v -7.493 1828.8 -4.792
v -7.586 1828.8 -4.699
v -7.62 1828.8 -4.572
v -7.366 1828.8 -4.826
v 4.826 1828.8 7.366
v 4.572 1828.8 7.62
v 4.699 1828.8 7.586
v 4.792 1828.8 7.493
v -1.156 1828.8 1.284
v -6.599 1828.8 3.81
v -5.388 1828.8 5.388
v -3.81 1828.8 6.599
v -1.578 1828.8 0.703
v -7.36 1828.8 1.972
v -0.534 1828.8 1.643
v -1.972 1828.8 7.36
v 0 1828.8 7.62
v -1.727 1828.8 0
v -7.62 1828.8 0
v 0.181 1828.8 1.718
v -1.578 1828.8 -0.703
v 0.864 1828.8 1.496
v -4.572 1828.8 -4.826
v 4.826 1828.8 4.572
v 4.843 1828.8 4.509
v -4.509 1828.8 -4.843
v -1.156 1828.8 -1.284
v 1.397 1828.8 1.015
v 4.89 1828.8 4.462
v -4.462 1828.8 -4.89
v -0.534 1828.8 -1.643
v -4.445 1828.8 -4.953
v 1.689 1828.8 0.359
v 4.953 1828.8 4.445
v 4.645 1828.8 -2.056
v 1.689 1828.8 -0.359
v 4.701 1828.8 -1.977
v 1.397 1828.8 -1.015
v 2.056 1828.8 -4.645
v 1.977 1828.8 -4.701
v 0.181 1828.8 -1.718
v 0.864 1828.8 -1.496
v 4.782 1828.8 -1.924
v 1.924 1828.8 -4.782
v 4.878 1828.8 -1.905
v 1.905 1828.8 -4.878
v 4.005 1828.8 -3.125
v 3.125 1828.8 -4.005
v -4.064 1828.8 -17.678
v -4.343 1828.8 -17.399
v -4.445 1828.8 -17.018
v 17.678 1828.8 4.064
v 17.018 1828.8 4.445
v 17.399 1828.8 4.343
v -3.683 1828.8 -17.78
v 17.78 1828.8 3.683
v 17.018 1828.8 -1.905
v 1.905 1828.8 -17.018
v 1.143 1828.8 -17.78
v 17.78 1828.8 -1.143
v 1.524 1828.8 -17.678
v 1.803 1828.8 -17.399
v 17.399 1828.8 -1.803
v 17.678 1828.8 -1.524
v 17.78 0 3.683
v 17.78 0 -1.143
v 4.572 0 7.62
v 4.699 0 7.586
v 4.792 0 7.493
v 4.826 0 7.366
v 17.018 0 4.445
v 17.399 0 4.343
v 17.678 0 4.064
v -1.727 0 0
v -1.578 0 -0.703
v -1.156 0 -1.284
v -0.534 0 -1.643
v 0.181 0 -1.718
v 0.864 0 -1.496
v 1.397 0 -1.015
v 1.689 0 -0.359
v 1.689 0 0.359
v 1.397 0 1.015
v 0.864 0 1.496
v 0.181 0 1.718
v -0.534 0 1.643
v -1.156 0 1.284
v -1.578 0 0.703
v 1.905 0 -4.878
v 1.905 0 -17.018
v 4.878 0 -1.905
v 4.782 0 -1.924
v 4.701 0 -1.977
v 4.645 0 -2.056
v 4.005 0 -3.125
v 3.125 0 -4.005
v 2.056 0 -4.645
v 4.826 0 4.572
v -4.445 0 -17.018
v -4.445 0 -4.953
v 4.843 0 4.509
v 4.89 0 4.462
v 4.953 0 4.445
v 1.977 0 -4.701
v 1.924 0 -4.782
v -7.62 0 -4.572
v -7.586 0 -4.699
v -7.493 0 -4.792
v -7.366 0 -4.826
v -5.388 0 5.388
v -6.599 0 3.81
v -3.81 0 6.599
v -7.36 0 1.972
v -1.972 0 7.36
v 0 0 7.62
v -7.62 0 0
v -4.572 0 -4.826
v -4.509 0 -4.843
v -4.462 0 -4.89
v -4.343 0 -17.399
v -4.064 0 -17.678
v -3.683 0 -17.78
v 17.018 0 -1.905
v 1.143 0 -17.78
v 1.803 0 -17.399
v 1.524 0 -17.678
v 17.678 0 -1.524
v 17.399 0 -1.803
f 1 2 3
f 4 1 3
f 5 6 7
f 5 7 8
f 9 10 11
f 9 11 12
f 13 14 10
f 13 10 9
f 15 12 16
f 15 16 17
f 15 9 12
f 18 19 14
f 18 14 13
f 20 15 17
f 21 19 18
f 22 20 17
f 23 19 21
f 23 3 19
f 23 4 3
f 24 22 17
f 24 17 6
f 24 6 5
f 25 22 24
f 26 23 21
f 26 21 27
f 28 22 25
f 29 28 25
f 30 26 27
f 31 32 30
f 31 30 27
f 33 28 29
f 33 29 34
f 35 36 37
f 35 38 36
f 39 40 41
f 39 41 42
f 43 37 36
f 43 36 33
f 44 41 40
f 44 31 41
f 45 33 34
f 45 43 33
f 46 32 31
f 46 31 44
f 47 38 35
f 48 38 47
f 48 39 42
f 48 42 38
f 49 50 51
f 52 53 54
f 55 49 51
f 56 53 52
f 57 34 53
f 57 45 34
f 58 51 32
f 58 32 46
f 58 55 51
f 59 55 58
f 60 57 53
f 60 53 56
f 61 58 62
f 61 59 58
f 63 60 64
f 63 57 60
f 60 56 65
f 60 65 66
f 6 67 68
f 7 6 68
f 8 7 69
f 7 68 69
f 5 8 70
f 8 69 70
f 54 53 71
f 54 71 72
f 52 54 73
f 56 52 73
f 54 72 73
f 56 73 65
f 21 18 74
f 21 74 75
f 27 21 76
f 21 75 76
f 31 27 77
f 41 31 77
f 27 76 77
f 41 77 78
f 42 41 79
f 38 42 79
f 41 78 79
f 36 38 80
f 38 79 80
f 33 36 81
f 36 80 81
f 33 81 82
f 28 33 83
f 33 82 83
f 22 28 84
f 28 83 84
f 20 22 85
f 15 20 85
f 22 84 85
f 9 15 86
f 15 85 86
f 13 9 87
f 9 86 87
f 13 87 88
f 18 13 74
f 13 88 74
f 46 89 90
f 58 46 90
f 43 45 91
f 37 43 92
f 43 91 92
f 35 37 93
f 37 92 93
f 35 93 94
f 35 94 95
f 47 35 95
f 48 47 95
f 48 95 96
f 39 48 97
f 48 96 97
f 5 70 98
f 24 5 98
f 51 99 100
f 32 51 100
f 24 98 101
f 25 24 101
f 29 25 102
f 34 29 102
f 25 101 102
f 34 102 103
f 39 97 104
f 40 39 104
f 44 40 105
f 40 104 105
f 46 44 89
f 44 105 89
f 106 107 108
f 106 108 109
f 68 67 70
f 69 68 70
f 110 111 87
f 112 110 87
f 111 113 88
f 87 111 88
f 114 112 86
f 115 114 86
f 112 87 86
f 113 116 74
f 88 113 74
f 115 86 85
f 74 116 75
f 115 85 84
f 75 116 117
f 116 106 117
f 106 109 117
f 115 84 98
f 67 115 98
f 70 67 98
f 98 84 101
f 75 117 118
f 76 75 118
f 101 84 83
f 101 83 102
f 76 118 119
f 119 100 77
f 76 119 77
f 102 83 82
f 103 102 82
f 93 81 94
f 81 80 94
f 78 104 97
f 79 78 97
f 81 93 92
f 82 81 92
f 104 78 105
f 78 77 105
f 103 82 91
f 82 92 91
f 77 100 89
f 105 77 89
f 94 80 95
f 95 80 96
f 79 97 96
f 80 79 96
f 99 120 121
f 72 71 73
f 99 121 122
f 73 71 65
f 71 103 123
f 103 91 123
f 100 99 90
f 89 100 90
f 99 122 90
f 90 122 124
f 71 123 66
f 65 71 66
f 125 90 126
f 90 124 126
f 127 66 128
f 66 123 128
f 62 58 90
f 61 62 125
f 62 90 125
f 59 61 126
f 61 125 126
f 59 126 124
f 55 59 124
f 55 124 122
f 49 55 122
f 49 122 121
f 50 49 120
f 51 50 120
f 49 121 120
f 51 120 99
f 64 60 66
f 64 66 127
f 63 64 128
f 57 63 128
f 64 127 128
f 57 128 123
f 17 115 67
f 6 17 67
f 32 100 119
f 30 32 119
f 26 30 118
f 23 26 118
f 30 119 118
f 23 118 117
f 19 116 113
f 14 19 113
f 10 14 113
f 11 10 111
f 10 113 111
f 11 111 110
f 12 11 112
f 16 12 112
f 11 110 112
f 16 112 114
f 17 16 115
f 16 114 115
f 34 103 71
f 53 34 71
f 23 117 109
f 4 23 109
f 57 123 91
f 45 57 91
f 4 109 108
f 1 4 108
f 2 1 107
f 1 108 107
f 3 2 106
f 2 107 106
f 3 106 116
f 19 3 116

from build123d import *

# Parameters (mm, degrees)
BOSS_EXTRUDE1_DEPTH = 1828.8
THRU_HOLES_D        = 3.4544


with BuildPart() as part:
    # Sketch1 → Boss-Extrude1 (new body)
    with BuildSketch(Plane(origin=(0, 0, 0), x_dir=(1, 0, 0), z_dir=(0, 1, 0))):
        with BuildLine():
            Line((-4.445, 17.018), (-4.445, 4.953))
            ThreePointArc((-4.445, 4.953), (-4.482197439, 4.863197439), (-4.572, 4.826))
            Line((-4.572, 4.826), (-7.366, 4.826))
            ThreePointArc((-7.366, 4.826), (-7.545605122, 4.751605122), (-7.62, 4.572))
            Line((-7.62, 4.572), (-7.62, 0))
            ThreePointArc((-7.62, 0), (-5.388153673, -5.388153673), (0, -7.62))
            Line((0, -7.62), (4.572, -7.62))
            ThreePointArc((4.572, -7.62), (4.751605122, -7.545605122), (4.826, -7.366))
            Line((4.826, -7.366), (4.826, -4.572))
            ThreePointArc((4.826, -4.572), (4.863197439, -4.482197439), (4.953, -4.445))
            Line((4.953, -4.445), (17.018, -4.445))
            ThreePointArc((17.018, -4.445), (17.556815367, -4.221815367), (17.78, -3.683))
            Line((17.78, -3.683), (17.78, 1.143))
            ThreePointArc((17.78, 1.143), (17.556815367, 1.681815367), (17.018, 1.905))
            Line((17.018, 1.905), (4.87752755, 1.905))
            ThreePointArc((4.87752755, 1.905), (4.73895919, 1.946127246), (4.645264333, 2.056190476))
            ThreePointArc((4.645264333, 2.056190476), (3.592102448, 3.592102448), (2.056190476, 4.645264333))
            ThreePointArc((2.056190476, 4.645264333), (1.946127246, 4.73895919), (1.905, 4.87752755))
            Line((1.905, 4.87752755), (1.905, 17.018))
            ThreePointArc((1.905, 17.018), (1.681815367, 17.556815367), (1.143, 17.78))
            Line((1.143, 17.78), (-3.683, 17.78))
            ThreePointArc((-3.683, 17.78), (-4.221815367, 17.556815367), (-4.445, 17.018))
        make_face()
    extrude(amount=BOSS_EXTRUDE1_DEPTH)

    # THRU HOLES (through all)
    with Locations(Plane(origin=(0, 1828.8, 0), x_dir=(1, 0, 0), z_dir=(0, 1, 0))):
        with Locations((0, 0)):
            Hole(THRU_HOLES_D / 2)


solid = part.part
